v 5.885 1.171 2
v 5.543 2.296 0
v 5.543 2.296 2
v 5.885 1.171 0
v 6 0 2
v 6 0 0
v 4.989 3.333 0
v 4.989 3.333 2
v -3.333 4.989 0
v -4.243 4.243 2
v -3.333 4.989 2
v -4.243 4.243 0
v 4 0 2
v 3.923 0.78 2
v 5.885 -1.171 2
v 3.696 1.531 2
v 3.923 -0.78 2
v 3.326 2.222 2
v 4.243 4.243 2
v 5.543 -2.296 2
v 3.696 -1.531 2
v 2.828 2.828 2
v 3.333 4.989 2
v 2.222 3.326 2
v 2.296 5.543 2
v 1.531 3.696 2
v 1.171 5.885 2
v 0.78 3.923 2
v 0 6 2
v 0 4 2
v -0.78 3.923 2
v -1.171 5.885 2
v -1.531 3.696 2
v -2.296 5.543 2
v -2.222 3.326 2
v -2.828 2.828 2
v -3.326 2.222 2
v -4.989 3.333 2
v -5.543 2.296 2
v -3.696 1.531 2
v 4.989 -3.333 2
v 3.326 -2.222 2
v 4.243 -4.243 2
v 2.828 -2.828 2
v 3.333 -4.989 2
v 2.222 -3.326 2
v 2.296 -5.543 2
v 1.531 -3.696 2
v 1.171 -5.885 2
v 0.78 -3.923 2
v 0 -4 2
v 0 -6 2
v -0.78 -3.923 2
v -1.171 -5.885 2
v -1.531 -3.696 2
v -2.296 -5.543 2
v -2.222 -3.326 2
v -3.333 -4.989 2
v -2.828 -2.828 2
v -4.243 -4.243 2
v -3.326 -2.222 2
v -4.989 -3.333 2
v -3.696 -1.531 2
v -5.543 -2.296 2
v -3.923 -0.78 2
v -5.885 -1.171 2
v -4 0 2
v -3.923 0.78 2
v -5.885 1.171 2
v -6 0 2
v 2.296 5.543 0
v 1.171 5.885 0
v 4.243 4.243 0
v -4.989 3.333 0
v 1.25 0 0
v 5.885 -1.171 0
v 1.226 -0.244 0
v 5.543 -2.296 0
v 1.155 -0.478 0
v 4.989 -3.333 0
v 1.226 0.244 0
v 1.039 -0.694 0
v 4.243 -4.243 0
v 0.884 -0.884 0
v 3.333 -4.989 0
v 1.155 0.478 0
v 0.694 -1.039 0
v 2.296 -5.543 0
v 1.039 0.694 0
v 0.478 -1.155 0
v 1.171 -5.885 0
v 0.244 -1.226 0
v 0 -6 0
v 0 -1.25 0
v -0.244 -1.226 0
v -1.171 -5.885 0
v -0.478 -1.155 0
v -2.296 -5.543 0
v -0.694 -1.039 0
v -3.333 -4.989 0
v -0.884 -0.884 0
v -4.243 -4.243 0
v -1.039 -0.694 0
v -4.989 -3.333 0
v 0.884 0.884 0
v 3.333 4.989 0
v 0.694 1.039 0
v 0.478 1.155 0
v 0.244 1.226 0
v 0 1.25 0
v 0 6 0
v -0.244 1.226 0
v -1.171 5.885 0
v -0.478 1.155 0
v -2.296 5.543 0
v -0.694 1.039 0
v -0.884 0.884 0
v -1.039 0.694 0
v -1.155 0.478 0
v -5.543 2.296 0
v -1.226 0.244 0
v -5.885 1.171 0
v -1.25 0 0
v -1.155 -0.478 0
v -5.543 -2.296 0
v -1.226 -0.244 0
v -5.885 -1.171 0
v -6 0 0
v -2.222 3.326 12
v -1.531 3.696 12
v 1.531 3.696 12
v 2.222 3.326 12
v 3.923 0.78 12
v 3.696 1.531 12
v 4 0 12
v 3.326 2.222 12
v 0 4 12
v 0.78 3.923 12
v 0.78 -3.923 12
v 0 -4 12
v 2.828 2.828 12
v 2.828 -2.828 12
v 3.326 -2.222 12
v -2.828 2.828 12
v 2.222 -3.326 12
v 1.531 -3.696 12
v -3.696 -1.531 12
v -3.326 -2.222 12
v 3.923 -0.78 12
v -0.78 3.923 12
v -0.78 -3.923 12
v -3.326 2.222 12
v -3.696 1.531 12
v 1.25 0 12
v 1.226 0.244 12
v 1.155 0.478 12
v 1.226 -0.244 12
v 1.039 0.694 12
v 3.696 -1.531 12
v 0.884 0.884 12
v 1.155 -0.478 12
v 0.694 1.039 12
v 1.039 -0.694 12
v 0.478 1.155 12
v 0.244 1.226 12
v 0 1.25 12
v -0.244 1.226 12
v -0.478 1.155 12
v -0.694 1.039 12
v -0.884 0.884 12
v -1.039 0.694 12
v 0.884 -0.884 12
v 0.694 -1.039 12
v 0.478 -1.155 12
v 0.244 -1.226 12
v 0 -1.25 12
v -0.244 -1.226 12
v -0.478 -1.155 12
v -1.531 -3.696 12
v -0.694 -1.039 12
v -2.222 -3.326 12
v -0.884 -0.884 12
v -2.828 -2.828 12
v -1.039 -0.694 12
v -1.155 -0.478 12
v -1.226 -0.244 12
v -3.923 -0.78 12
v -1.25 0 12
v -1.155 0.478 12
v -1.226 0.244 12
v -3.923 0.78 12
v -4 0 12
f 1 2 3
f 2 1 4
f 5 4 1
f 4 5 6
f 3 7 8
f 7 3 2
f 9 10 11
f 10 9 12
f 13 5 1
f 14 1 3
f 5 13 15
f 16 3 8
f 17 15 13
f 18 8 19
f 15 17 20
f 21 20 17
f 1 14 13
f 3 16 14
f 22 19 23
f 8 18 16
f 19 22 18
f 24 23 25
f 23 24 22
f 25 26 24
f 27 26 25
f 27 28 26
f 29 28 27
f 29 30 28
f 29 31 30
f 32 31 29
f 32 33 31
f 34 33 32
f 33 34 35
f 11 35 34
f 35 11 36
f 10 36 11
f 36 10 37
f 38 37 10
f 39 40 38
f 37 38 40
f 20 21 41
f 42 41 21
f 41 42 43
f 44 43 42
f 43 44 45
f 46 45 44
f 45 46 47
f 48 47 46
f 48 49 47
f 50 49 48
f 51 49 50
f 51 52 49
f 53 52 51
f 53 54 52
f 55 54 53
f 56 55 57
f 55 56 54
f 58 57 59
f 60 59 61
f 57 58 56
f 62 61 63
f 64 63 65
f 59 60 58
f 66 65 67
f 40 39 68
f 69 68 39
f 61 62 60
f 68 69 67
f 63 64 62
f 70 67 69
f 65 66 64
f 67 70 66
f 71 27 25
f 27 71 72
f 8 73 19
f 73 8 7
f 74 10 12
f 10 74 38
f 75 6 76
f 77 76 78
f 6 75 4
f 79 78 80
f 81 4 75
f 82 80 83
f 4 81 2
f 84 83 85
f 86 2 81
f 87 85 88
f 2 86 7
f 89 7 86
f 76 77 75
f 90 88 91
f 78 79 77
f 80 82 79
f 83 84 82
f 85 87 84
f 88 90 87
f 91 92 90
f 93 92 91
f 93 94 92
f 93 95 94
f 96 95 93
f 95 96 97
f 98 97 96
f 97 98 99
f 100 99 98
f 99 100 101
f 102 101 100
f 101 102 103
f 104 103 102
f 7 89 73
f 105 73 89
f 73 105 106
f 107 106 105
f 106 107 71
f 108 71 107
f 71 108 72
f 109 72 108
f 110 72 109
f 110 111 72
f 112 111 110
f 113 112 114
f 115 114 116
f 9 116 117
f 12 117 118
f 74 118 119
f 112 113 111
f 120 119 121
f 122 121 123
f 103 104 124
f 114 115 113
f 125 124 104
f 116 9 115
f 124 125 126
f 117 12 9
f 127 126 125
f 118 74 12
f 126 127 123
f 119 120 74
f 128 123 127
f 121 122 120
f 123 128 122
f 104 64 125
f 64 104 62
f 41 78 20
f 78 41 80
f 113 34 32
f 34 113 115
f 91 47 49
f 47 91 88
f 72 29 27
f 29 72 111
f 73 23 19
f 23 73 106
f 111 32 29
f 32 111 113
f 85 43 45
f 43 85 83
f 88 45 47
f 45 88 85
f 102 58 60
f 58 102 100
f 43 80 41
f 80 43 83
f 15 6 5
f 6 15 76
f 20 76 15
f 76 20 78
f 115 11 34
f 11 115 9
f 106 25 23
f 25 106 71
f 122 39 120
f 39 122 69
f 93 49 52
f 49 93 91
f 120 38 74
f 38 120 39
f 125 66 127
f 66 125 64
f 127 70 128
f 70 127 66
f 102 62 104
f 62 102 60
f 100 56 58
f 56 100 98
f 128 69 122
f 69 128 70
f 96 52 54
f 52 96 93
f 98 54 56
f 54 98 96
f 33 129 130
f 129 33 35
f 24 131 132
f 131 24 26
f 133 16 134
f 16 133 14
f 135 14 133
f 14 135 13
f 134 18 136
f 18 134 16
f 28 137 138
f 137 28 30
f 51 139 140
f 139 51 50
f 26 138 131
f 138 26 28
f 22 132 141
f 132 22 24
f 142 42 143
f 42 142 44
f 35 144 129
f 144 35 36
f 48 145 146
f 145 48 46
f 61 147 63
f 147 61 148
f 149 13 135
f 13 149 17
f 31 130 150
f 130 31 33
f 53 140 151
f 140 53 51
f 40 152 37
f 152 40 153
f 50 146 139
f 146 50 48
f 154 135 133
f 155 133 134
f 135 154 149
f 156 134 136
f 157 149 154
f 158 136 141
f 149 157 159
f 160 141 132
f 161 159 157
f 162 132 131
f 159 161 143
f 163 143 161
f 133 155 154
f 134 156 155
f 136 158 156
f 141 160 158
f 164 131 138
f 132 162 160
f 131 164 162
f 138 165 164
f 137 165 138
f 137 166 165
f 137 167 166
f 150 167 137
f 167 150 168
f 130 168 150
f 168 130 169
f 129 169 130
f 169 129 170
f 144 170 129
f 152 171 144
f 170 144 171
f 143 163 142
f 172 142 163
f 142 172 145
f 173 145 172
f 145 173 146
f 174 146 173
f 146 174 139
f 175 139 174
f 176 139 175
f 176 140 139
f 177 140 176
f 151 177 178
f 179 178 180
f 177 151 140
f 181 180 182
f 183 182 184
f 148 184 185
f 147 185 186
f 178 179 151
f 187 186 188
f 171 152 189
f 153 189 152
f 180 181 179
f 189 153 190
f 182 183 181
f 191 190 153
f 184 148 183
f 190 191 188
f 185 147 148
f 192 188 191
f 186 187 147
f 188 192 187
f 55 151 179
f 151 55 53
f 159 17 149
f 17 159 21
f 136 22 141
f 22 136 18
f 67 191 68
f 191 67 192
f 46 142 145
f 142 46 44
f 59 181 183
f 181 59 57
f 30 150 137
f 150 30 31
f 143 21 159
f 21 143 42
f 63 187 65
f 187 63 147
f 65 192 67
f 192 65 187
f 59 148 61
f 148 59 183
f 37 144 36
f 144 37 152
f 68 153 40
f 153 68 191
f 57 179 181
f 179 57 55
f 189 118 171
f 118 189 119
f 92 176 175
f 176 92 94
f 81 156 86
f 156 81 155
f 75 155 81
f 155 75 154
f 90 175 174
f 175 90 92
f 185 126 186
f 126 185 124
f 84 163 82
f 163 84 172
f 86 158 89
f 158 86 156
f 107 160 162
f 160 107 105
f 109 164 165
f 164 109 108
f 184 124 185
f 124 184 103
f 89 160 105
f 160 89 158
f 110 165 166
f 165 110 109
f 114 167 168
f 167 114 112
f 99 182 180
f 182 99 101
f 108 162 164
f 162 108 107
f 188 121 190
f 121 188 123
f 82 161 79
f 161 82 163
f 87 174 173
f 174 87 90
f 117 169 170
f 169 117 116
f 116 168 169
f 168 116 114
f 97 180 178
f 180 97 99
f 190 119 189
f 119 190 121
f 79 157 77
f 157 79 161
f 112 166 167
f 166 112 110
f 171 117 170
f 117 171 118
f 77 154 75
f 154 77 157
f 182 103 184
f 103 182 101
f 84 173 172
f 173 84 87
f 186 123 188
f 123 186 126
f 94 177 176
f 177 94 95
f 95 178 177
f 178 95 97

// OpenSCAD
$fn = 32;

// ----------------------------------------------------------------------
// Micro post: flanged post, 5-20 mm class
// ----------------------------------------------------------------------

// --- parameters (mm) ---
post_d = 8;               // post diameter
post_h = 10;              // post height above the flange
flange_d = 12;            // flange diameter
flange_t = 2;             // flange thickness
bore_d = 2.5;             // through bore

total_h = post_h + flange_t;  // overall height

difference() {
  union() {
    cylinder(h = flange_t, d = flange_d);
    translate([0, 0, flange_t]) cylinder(h = post_h, d = post_d);
  }
  translate([0, 0, -1]) cylinder(h = total_h + 2, d = bore_d);
}
